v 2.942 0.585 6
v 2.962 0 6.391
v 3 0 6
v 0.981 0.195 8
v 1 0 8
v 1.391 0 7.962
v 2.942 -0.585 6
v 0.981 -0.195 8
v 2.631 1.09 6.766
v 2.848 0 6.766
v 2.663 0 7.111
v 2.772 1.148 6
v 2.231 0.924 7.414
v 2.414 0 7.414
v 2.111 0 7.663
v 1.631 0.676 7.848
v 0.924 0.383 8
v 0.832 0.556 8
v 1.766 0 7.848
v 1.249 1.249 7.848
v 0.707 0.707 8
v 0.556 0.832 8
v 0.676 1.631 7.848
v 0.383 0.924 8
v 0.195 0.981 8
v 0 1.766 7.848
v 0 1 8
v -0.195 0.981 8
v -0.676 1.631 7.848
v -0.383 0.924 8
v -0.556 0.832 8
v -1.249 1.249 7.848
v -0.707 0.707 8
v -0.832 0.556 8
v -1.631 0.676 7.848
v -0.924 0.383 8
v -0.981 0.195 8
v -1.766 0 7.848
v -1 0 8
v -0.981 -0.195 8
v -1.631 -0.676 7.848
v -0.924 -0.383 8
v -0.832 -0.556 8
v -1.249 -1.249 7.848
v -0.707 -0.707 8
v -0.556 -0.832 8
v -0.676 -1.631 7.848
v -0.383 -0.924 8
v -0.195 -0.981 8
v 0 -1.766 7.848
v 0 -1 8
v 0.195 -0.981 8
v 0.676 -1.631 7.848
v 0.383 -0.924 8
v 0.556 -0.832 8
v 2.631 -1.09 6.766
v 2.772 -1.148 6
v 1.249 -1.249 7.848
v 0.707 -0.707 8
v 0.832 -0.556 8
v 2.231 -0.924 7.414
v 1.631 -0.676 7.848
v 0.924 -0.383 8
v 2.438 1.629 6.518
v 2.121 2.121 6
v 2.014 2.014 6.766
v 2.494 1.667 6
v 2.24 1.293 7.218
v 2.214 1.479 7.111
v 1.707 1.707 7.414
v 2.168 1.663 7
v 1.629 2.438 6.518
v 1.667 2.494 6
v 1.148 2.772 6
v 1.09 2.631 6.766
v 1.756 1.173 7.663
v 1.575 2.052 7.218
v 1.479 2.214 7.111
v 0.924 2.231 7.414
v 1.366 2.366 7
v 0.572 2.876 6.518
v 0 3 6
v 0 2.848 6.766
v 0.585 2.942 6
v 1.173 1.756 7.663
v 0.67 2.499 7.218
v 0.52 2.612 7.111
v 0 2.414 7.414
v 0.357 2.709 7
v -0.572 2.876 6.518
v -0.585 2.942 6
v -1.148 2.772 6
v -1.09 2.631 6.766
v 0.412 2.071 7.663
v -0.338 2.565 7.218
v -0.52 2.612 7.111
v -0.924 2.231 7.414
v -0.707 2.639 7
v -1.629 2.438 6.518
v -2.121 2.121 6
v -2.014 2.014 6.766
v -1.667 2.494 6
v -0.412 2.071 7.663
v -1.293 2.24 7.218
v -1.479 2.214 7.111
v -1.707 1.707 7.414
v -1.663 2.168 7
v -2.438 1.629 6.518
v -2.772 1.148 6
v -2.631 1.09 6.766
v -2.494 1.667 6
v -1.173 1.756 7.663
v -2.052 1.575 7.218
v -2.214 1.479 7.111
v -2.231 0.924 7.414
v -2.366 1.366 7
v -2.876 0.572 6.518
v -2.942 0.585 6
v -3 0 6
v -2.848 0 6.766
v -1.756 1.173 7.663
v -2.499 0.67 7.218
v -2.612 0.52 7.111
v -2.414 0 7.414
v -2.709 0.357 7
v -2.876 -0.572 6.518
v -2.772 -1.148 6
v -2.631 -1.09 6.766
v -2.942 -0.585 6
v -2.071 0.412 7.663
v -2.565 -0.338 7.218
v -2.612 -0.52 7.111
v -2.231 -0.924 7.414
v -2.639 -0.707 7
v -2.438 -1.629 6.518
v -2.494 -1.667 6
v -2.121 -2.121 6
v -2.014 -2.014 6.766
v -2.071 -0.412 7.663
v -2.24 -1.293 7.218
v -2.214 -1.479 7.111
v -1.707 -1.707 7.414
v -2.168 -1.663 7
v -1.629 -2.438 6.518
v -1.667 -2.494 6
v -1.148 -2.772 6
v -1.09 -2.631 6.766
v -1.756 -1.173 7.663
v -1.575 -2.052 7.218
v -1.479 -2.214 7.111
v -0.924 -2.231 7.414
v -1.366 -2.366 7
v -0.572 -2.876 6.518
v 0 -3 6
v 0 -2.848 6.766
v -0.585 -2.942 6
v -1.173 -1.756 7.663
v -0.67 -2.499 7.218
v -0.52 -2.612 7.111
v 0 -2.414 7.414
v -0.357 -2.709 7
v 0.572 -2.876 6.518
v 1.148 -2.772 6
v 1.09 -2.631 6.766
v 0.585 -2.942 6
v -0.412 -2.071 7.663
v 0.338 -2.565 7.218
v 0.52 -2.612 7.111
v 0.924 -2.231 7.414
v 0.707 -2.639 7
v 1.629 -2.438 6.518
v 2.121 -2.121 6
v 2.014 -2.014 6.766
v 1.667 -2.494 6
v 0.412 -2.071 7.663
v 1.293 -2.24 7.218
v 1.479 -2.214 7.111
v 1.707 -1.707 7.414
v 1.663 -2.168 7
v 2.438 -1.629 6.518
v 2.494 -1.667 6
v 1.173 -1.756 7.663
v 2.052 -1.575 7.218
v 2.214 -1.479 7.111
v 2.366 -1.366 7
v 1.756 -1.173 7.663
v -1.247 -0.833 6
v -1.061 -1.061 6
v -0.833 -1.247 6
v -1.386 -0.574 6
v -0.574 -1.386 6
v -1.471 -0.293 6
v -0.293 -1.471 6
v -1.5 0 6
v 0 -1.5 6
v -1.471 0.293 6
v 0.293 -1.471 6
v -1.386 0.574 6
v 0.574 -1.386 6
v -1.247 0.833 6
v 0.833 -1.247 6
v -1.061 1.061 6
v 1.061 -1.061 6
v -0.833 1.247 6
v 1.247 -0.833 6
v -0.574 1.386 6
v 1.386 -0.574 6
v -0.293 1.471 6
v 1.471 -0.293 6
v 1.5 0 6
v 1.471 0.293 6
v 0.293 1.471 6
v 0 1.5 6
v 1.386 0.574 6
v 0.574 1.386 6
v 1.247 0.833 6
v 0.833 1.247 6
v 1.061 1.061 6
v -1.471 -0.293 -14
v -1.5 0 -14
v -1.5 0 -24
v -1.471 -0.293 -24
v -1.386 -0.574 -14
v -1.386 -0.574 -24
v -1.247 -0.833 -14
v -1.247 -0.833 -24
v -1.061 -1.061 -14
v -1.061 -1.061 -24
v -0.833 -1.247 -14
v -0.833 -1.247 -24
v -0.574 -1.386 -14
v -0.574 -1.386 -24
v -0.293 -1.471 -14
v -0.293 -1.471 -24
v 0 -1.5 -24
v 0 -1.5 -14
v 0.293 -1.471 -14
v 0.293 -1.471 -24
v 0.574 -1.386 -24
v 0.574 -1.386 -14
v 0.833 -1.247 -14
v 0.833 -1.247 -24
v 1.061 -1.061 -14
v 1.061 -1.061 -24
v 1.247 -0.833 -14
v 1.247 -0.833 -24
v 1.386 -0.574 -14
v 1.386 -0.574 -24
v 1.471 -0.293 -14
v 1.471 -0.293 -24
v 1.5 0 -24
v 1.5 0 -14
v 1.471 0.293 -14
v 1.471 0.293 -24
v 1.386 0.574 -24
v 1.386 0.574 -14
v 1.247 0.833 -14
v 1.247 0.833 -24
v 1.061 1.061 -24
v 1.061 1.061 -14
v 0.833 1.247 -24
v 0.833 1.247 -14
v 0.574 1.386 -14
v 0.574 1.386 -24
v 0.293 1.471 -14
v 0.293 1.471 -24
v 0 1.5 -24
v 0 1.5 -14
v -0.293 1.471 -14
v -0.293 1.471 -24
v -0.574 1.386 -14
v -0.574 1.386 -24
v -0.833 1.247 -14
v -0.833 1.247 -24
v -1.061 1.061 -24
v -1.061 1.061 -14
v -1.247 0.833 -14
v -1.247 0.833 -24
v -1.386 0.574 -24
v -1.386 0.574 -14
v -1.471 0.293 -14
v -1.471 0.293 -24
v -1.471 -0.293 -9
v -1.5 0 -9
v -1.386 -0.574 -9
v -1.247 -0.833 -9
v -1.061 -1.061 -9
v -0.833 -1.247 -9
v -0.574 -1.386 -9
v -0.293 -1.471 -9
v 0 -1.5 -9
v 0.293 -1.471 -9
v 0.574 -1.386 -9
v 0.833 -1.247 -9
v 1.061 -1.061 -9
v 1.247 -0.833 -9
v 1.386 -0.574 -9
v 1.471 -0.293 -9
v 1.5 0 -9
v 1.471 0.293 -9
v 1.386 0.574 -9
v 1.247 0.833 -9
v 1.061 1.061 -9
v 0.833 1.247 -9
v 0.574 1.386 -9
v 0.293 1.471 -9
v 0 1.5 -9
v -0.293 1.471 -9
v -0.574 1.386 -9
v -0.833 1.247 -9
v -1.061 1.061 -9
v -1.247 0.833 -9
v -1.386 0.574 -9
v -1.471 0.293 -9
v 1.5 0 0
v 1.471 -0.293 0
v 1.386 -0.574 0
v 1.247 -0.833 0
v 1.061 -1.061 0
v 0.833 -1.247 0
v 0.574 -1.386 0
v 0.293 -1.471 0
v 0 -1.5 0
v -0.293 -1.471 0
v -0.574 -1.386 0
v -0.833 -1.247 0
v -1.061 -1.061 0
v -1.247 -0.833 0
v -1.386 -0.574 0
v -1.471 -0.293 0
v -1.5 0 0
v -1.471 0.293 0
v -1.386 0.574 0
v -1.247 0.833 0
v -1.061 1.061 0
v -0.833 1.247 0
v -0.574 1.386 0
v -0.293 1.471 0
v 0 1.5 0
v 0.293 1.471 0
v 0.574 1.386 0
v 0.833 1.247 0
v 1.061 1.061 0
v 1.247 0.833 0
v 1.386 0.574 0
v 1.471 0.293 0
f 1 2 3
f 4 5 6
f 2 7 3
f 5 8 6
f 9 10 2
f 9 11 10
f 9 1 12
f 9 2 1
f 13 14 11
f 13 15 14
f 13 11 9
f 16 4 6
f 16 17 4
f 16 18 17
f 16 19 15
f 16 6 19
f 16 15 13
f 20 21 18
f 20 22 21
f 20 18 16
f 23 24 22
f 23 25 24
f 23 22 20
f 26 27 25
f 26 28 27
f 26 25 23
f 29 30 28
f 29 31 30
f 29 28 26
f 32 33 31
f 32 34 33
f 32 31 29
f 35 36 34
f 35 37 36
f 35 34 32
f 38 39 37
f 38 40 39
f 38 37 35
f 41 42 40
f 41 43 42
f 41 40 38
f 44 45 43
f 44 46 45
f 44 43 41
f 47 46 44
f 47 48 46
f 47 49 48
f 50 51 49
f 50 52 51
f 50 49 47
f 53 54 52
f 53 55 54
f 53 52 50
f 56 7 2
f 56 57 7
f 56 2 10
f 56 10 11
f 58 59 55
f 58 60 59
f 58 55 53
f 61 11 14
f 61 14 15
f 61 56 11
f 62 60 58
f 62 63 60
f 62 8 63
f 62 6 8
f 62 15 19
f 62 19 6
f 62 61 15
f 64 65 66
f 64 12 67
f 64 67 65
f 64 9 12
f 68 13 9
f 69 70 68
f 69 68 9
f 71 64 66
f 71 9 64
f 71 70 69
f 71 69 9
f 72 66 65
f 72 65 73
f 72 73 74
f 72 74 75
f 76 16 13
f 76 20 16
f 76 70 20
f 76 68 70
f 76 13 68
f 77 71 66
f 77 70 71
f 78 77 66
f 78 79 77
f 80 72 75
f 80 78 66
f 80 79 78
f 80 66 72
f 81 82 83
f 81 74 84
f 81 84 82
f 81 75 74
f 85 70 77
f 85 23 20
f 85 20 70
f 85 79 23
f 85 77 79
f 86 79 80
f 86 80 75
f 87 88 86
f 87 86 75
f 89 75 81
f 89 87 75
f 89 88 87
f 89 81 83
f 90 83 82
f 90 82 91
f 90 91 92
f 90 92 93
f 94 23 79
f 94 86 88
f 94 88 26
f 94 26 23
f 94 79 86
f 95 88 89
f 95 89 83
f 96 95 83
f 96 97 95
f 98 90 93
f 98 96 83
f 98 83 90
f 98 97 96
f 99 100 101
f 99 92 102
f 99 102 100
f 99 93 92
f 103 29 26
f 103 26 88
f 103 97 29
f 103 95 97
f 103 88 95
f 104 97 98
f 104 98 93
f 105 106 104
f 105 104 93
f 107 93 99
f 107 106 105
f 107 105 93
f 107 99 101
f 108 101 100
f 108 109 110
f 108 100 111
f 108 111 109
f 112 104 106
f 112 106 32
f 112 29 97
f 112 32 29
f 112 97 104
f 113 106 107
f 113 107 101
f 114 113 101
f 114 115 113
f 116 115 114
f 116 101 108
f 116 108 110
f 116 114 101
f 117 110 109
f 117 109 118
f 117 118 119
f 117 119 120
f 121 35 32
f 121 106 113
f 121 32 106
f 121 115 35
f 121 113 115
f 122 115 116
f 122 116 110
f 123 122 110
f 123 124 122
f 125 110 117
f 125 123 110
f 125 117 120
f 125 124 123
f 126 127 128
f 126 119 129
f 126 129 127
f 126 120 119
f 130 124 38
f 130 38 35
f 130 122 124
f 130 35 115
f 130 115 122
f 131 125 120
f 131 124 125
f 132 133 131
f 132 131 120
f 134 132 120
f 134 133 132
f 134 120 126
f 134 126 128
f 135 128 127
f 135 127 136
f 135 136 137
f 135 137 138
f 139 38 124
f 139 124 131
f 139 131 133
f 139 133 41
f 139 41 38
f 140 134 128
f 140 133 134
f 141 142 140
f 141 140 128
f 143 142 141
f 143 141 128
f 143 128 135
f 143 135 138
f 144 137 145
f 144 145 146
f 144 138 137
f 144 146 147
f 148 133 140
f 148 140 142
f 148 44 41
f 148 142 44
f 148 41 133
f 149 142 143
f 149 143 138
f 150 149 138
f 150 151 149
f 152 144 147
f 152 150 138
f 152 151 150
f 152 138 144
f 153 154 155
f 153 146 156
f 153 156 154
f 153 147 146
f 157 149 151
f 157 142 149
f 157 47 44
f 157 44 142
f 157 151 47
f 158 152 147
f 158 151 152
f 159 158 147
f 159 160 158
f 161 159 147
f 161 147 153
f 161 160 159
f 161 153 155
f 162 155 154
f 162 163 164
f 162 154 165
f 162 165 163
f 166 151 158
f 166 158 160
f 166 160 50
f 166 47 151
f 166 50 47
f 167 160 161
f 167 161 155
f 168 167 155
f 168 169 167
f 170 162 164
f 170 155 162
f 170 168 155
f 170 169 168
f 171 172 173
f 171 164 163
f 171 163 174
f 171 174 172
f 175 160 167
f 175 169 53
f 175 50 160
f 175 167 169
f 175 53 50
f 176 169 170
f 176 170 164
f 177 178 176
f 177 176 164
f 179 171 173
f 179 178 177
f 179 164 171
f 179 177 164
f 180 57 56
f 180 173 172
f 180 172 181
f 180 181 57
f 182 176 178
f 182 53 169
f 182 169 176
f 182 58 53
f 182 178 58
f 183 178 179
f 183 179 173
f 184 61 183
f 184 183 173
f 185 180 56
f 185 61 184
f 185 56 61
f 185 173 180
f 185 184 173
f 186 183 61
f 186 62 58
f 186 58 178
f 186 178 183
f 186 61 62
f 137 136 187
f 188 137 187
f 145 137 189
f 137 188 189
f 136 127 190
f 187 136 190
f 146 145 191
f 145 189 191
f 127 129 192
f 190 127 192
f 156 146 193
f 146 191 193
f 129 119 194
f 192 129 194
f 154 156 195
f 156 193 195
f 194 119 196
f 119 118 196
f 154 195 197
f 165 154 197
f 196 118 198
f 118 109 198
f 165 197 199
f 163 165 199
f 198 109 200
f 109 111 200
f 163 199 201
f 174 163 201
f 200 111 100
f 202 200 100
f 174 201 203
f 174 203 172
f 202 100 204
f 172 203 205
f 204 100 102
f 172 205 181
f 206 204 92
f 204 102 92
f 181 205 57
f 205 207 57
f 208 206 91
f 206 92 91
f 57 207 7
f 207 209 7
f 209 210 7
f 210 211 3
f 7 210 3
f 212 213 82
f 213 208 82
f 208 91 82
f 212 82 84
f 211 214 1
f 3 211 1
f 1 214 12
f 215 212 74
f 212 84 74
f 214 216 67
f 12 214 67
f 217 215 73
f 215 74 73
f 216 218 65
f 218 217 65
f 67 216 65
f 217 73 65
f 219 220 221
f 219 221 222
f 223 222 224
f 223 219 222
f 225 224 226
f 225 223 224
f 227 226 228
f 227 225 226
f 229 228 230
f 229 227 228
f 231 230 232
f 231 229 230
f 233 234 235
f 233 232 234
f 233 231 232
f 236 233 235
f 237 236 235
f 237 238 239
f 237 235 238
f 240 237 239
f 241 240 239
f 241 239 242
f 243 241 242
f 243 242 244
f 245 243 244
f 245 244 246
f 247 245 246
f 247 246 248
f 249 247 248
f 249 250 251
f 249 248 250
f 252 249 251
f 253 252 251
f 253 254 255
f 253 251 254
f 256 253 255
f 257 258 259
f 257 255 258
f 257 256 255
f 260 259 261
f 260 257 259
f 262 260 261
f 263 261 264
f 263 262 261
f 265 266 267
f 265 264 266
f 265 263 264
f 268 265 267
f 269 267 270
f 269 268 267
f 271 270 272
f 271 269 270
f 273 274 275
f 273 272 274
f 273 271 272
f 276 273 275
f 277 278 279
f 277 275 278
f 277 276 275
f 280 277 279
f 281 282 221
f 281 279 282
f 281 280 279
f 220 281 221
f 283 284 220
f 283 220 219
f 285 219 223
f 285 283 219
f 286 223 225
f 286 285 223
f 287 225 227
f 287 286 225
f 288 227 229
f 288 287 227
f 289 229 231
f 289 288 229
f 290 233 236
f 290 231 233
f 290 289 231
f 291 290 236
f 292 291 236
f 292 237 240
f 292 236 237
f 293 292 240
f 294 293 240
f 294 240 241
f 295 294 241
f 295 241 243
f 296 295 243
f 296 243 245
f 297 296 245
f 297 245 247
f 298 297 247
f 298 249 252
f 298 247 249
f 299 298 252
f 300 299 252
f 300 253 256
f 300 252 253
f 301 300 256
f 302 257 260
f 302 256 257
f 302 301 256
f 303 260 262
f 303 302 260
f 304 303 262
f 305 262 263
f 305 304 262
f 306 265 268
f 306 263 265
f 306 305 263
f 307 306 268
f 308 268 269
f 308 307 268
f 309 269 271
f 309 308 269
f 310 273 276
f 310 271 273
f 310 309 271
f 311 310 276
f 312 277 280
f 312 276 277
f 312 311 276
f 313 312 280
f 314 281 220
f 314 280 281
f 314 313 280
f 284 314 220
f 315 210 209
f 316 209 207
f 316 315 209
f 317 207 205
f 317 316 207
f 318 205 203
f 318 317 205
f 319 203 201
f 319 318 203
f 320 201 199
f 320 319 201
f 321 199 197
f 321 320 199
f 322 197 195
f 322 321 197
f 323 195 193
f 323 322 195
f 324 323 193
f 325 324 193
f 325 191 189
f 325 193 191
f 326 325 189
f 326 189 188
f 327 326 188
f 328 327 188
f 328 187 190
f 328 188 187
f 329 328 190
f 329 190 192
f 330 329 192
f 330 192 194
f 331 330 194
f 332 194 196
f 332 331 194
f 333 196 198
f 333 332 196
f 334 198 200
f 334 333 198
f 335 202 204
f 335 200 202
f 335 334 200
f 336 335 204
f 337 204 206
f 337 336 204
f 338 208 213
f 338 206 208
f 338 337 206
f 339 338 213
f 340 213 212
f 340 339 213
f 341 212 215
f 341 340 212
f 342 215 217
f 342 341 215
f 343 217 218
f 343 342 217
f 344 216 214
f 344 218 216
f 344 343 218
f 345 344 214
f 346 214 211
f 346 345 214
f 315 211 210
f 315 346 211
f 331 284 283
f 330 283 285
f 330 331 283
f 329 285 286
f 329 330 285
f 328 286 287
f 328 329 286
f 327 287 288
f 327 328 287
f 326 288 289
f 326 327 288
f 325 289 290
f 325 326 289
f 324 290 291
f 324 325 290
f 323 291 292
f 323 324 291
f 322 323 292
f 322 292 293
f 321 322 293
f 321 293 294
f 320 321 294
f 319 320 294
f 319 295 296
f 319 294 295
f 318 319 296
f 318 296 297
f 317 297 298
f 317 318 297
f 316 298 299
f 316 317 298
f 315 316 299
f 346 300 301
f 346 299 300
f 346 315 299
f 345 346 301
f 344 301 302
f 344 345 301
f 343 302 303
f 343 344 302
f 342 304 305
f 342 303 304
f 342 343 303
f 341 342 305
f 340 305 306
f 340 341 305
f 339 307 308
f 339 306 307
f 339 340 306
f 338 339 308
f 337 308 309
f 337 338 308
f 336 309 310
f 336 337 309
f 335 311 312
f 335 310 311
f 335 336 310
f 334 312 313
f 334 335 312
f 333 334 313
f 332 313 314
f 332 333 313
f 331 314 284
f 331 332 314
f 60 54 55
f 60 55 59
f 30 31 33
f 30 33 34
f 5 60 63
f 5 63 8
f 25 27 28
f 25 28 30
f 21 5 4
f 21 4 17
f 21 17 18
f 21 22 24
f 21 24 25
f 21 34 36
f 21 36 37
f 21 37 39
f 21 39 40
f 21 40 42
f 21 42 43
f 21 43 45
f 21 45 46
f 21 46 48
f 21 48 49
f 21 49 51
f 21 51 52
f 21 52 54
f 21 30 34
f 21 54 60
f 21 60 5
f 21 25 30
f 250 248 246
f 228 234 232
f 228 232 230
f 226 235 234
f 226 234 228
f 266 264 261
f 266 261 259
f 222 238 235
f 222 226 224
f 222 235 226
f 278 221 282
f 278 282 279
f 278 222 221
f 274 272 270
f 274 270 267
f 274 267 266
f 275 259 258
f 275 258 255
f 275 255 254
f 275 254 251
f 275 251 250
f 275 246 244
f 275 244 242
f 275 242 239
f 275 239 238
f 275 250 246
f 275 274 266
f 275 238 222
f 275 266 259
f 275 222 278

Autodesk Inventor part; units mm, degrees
ref_plane "YZ Plane" through (0, 0, 0) normal (1, 0, 0) x (0, 1, 0)
ref_plane "XZ Plane" through (0, 0, 0) normal (0, 1, 0) x (-1, 0, 0)
ref_plane "XY Plane" through (0, 0, 0) normal (0, 0, 1) x (1, 0, 0)
sketch "スケッチ1" plane through (0, 0, 0) normal (0, 0, 1) x (1, 0, 0)
  circle A0 centre (0, 0) radius 1.5
  dimension "d0" = 3
extrude "押し出し1" add sketch "スケッチ1" along normal blind 6
sketch "スケッチ2" plane through (0, 0, 6) normal (0, 0, 1) x (1, 0, 0)
  circle A0 centre (0, 0) radius 1.5 projected
  circle A1 centre (0, 0) radius 3
  dimension "d3" = 6
extrude "押し出し2" add sketch "スケッチ2" along normal blind 2 contours A0 | A1
fillet "フィレット1" radius 2 1 edges at (-3, 0, 8)
thread "ねじ1" size "M3x0.5" class "6g" standard "ANSI Metric M Profile" full length
sketch "スケッチ3" plane through (0, 0, 0) normal (0, 0, -1) x (-1, 0, 0)
  circle A0 centre (0, 0) radius 1.5 projected
extrude "押し出し3" add sketch "スケッチ3" along normal blind 9
sketch "スケッチ4" plane through (0, 0, -9) normal (0, 0, -1) x (-1, 0, 0)
  circle A0 centre (0, 0) radius 1.5 projected
extrude "押し出し4" add sketch "スケッチ4" along normal blind 5
sketch "スケッチ5" plane through (0, 0, -14) normal (0, 0, -1) x (-1, 0, 0)
  circle A0 centre (0, 0) radius 1.5
  dimension "d13" = 3
extrude "押し出し5" add sketch "スケッチ5" along normal blind 10
properties part number "SB　30mmなべネジ" material "Steel, Mild"
